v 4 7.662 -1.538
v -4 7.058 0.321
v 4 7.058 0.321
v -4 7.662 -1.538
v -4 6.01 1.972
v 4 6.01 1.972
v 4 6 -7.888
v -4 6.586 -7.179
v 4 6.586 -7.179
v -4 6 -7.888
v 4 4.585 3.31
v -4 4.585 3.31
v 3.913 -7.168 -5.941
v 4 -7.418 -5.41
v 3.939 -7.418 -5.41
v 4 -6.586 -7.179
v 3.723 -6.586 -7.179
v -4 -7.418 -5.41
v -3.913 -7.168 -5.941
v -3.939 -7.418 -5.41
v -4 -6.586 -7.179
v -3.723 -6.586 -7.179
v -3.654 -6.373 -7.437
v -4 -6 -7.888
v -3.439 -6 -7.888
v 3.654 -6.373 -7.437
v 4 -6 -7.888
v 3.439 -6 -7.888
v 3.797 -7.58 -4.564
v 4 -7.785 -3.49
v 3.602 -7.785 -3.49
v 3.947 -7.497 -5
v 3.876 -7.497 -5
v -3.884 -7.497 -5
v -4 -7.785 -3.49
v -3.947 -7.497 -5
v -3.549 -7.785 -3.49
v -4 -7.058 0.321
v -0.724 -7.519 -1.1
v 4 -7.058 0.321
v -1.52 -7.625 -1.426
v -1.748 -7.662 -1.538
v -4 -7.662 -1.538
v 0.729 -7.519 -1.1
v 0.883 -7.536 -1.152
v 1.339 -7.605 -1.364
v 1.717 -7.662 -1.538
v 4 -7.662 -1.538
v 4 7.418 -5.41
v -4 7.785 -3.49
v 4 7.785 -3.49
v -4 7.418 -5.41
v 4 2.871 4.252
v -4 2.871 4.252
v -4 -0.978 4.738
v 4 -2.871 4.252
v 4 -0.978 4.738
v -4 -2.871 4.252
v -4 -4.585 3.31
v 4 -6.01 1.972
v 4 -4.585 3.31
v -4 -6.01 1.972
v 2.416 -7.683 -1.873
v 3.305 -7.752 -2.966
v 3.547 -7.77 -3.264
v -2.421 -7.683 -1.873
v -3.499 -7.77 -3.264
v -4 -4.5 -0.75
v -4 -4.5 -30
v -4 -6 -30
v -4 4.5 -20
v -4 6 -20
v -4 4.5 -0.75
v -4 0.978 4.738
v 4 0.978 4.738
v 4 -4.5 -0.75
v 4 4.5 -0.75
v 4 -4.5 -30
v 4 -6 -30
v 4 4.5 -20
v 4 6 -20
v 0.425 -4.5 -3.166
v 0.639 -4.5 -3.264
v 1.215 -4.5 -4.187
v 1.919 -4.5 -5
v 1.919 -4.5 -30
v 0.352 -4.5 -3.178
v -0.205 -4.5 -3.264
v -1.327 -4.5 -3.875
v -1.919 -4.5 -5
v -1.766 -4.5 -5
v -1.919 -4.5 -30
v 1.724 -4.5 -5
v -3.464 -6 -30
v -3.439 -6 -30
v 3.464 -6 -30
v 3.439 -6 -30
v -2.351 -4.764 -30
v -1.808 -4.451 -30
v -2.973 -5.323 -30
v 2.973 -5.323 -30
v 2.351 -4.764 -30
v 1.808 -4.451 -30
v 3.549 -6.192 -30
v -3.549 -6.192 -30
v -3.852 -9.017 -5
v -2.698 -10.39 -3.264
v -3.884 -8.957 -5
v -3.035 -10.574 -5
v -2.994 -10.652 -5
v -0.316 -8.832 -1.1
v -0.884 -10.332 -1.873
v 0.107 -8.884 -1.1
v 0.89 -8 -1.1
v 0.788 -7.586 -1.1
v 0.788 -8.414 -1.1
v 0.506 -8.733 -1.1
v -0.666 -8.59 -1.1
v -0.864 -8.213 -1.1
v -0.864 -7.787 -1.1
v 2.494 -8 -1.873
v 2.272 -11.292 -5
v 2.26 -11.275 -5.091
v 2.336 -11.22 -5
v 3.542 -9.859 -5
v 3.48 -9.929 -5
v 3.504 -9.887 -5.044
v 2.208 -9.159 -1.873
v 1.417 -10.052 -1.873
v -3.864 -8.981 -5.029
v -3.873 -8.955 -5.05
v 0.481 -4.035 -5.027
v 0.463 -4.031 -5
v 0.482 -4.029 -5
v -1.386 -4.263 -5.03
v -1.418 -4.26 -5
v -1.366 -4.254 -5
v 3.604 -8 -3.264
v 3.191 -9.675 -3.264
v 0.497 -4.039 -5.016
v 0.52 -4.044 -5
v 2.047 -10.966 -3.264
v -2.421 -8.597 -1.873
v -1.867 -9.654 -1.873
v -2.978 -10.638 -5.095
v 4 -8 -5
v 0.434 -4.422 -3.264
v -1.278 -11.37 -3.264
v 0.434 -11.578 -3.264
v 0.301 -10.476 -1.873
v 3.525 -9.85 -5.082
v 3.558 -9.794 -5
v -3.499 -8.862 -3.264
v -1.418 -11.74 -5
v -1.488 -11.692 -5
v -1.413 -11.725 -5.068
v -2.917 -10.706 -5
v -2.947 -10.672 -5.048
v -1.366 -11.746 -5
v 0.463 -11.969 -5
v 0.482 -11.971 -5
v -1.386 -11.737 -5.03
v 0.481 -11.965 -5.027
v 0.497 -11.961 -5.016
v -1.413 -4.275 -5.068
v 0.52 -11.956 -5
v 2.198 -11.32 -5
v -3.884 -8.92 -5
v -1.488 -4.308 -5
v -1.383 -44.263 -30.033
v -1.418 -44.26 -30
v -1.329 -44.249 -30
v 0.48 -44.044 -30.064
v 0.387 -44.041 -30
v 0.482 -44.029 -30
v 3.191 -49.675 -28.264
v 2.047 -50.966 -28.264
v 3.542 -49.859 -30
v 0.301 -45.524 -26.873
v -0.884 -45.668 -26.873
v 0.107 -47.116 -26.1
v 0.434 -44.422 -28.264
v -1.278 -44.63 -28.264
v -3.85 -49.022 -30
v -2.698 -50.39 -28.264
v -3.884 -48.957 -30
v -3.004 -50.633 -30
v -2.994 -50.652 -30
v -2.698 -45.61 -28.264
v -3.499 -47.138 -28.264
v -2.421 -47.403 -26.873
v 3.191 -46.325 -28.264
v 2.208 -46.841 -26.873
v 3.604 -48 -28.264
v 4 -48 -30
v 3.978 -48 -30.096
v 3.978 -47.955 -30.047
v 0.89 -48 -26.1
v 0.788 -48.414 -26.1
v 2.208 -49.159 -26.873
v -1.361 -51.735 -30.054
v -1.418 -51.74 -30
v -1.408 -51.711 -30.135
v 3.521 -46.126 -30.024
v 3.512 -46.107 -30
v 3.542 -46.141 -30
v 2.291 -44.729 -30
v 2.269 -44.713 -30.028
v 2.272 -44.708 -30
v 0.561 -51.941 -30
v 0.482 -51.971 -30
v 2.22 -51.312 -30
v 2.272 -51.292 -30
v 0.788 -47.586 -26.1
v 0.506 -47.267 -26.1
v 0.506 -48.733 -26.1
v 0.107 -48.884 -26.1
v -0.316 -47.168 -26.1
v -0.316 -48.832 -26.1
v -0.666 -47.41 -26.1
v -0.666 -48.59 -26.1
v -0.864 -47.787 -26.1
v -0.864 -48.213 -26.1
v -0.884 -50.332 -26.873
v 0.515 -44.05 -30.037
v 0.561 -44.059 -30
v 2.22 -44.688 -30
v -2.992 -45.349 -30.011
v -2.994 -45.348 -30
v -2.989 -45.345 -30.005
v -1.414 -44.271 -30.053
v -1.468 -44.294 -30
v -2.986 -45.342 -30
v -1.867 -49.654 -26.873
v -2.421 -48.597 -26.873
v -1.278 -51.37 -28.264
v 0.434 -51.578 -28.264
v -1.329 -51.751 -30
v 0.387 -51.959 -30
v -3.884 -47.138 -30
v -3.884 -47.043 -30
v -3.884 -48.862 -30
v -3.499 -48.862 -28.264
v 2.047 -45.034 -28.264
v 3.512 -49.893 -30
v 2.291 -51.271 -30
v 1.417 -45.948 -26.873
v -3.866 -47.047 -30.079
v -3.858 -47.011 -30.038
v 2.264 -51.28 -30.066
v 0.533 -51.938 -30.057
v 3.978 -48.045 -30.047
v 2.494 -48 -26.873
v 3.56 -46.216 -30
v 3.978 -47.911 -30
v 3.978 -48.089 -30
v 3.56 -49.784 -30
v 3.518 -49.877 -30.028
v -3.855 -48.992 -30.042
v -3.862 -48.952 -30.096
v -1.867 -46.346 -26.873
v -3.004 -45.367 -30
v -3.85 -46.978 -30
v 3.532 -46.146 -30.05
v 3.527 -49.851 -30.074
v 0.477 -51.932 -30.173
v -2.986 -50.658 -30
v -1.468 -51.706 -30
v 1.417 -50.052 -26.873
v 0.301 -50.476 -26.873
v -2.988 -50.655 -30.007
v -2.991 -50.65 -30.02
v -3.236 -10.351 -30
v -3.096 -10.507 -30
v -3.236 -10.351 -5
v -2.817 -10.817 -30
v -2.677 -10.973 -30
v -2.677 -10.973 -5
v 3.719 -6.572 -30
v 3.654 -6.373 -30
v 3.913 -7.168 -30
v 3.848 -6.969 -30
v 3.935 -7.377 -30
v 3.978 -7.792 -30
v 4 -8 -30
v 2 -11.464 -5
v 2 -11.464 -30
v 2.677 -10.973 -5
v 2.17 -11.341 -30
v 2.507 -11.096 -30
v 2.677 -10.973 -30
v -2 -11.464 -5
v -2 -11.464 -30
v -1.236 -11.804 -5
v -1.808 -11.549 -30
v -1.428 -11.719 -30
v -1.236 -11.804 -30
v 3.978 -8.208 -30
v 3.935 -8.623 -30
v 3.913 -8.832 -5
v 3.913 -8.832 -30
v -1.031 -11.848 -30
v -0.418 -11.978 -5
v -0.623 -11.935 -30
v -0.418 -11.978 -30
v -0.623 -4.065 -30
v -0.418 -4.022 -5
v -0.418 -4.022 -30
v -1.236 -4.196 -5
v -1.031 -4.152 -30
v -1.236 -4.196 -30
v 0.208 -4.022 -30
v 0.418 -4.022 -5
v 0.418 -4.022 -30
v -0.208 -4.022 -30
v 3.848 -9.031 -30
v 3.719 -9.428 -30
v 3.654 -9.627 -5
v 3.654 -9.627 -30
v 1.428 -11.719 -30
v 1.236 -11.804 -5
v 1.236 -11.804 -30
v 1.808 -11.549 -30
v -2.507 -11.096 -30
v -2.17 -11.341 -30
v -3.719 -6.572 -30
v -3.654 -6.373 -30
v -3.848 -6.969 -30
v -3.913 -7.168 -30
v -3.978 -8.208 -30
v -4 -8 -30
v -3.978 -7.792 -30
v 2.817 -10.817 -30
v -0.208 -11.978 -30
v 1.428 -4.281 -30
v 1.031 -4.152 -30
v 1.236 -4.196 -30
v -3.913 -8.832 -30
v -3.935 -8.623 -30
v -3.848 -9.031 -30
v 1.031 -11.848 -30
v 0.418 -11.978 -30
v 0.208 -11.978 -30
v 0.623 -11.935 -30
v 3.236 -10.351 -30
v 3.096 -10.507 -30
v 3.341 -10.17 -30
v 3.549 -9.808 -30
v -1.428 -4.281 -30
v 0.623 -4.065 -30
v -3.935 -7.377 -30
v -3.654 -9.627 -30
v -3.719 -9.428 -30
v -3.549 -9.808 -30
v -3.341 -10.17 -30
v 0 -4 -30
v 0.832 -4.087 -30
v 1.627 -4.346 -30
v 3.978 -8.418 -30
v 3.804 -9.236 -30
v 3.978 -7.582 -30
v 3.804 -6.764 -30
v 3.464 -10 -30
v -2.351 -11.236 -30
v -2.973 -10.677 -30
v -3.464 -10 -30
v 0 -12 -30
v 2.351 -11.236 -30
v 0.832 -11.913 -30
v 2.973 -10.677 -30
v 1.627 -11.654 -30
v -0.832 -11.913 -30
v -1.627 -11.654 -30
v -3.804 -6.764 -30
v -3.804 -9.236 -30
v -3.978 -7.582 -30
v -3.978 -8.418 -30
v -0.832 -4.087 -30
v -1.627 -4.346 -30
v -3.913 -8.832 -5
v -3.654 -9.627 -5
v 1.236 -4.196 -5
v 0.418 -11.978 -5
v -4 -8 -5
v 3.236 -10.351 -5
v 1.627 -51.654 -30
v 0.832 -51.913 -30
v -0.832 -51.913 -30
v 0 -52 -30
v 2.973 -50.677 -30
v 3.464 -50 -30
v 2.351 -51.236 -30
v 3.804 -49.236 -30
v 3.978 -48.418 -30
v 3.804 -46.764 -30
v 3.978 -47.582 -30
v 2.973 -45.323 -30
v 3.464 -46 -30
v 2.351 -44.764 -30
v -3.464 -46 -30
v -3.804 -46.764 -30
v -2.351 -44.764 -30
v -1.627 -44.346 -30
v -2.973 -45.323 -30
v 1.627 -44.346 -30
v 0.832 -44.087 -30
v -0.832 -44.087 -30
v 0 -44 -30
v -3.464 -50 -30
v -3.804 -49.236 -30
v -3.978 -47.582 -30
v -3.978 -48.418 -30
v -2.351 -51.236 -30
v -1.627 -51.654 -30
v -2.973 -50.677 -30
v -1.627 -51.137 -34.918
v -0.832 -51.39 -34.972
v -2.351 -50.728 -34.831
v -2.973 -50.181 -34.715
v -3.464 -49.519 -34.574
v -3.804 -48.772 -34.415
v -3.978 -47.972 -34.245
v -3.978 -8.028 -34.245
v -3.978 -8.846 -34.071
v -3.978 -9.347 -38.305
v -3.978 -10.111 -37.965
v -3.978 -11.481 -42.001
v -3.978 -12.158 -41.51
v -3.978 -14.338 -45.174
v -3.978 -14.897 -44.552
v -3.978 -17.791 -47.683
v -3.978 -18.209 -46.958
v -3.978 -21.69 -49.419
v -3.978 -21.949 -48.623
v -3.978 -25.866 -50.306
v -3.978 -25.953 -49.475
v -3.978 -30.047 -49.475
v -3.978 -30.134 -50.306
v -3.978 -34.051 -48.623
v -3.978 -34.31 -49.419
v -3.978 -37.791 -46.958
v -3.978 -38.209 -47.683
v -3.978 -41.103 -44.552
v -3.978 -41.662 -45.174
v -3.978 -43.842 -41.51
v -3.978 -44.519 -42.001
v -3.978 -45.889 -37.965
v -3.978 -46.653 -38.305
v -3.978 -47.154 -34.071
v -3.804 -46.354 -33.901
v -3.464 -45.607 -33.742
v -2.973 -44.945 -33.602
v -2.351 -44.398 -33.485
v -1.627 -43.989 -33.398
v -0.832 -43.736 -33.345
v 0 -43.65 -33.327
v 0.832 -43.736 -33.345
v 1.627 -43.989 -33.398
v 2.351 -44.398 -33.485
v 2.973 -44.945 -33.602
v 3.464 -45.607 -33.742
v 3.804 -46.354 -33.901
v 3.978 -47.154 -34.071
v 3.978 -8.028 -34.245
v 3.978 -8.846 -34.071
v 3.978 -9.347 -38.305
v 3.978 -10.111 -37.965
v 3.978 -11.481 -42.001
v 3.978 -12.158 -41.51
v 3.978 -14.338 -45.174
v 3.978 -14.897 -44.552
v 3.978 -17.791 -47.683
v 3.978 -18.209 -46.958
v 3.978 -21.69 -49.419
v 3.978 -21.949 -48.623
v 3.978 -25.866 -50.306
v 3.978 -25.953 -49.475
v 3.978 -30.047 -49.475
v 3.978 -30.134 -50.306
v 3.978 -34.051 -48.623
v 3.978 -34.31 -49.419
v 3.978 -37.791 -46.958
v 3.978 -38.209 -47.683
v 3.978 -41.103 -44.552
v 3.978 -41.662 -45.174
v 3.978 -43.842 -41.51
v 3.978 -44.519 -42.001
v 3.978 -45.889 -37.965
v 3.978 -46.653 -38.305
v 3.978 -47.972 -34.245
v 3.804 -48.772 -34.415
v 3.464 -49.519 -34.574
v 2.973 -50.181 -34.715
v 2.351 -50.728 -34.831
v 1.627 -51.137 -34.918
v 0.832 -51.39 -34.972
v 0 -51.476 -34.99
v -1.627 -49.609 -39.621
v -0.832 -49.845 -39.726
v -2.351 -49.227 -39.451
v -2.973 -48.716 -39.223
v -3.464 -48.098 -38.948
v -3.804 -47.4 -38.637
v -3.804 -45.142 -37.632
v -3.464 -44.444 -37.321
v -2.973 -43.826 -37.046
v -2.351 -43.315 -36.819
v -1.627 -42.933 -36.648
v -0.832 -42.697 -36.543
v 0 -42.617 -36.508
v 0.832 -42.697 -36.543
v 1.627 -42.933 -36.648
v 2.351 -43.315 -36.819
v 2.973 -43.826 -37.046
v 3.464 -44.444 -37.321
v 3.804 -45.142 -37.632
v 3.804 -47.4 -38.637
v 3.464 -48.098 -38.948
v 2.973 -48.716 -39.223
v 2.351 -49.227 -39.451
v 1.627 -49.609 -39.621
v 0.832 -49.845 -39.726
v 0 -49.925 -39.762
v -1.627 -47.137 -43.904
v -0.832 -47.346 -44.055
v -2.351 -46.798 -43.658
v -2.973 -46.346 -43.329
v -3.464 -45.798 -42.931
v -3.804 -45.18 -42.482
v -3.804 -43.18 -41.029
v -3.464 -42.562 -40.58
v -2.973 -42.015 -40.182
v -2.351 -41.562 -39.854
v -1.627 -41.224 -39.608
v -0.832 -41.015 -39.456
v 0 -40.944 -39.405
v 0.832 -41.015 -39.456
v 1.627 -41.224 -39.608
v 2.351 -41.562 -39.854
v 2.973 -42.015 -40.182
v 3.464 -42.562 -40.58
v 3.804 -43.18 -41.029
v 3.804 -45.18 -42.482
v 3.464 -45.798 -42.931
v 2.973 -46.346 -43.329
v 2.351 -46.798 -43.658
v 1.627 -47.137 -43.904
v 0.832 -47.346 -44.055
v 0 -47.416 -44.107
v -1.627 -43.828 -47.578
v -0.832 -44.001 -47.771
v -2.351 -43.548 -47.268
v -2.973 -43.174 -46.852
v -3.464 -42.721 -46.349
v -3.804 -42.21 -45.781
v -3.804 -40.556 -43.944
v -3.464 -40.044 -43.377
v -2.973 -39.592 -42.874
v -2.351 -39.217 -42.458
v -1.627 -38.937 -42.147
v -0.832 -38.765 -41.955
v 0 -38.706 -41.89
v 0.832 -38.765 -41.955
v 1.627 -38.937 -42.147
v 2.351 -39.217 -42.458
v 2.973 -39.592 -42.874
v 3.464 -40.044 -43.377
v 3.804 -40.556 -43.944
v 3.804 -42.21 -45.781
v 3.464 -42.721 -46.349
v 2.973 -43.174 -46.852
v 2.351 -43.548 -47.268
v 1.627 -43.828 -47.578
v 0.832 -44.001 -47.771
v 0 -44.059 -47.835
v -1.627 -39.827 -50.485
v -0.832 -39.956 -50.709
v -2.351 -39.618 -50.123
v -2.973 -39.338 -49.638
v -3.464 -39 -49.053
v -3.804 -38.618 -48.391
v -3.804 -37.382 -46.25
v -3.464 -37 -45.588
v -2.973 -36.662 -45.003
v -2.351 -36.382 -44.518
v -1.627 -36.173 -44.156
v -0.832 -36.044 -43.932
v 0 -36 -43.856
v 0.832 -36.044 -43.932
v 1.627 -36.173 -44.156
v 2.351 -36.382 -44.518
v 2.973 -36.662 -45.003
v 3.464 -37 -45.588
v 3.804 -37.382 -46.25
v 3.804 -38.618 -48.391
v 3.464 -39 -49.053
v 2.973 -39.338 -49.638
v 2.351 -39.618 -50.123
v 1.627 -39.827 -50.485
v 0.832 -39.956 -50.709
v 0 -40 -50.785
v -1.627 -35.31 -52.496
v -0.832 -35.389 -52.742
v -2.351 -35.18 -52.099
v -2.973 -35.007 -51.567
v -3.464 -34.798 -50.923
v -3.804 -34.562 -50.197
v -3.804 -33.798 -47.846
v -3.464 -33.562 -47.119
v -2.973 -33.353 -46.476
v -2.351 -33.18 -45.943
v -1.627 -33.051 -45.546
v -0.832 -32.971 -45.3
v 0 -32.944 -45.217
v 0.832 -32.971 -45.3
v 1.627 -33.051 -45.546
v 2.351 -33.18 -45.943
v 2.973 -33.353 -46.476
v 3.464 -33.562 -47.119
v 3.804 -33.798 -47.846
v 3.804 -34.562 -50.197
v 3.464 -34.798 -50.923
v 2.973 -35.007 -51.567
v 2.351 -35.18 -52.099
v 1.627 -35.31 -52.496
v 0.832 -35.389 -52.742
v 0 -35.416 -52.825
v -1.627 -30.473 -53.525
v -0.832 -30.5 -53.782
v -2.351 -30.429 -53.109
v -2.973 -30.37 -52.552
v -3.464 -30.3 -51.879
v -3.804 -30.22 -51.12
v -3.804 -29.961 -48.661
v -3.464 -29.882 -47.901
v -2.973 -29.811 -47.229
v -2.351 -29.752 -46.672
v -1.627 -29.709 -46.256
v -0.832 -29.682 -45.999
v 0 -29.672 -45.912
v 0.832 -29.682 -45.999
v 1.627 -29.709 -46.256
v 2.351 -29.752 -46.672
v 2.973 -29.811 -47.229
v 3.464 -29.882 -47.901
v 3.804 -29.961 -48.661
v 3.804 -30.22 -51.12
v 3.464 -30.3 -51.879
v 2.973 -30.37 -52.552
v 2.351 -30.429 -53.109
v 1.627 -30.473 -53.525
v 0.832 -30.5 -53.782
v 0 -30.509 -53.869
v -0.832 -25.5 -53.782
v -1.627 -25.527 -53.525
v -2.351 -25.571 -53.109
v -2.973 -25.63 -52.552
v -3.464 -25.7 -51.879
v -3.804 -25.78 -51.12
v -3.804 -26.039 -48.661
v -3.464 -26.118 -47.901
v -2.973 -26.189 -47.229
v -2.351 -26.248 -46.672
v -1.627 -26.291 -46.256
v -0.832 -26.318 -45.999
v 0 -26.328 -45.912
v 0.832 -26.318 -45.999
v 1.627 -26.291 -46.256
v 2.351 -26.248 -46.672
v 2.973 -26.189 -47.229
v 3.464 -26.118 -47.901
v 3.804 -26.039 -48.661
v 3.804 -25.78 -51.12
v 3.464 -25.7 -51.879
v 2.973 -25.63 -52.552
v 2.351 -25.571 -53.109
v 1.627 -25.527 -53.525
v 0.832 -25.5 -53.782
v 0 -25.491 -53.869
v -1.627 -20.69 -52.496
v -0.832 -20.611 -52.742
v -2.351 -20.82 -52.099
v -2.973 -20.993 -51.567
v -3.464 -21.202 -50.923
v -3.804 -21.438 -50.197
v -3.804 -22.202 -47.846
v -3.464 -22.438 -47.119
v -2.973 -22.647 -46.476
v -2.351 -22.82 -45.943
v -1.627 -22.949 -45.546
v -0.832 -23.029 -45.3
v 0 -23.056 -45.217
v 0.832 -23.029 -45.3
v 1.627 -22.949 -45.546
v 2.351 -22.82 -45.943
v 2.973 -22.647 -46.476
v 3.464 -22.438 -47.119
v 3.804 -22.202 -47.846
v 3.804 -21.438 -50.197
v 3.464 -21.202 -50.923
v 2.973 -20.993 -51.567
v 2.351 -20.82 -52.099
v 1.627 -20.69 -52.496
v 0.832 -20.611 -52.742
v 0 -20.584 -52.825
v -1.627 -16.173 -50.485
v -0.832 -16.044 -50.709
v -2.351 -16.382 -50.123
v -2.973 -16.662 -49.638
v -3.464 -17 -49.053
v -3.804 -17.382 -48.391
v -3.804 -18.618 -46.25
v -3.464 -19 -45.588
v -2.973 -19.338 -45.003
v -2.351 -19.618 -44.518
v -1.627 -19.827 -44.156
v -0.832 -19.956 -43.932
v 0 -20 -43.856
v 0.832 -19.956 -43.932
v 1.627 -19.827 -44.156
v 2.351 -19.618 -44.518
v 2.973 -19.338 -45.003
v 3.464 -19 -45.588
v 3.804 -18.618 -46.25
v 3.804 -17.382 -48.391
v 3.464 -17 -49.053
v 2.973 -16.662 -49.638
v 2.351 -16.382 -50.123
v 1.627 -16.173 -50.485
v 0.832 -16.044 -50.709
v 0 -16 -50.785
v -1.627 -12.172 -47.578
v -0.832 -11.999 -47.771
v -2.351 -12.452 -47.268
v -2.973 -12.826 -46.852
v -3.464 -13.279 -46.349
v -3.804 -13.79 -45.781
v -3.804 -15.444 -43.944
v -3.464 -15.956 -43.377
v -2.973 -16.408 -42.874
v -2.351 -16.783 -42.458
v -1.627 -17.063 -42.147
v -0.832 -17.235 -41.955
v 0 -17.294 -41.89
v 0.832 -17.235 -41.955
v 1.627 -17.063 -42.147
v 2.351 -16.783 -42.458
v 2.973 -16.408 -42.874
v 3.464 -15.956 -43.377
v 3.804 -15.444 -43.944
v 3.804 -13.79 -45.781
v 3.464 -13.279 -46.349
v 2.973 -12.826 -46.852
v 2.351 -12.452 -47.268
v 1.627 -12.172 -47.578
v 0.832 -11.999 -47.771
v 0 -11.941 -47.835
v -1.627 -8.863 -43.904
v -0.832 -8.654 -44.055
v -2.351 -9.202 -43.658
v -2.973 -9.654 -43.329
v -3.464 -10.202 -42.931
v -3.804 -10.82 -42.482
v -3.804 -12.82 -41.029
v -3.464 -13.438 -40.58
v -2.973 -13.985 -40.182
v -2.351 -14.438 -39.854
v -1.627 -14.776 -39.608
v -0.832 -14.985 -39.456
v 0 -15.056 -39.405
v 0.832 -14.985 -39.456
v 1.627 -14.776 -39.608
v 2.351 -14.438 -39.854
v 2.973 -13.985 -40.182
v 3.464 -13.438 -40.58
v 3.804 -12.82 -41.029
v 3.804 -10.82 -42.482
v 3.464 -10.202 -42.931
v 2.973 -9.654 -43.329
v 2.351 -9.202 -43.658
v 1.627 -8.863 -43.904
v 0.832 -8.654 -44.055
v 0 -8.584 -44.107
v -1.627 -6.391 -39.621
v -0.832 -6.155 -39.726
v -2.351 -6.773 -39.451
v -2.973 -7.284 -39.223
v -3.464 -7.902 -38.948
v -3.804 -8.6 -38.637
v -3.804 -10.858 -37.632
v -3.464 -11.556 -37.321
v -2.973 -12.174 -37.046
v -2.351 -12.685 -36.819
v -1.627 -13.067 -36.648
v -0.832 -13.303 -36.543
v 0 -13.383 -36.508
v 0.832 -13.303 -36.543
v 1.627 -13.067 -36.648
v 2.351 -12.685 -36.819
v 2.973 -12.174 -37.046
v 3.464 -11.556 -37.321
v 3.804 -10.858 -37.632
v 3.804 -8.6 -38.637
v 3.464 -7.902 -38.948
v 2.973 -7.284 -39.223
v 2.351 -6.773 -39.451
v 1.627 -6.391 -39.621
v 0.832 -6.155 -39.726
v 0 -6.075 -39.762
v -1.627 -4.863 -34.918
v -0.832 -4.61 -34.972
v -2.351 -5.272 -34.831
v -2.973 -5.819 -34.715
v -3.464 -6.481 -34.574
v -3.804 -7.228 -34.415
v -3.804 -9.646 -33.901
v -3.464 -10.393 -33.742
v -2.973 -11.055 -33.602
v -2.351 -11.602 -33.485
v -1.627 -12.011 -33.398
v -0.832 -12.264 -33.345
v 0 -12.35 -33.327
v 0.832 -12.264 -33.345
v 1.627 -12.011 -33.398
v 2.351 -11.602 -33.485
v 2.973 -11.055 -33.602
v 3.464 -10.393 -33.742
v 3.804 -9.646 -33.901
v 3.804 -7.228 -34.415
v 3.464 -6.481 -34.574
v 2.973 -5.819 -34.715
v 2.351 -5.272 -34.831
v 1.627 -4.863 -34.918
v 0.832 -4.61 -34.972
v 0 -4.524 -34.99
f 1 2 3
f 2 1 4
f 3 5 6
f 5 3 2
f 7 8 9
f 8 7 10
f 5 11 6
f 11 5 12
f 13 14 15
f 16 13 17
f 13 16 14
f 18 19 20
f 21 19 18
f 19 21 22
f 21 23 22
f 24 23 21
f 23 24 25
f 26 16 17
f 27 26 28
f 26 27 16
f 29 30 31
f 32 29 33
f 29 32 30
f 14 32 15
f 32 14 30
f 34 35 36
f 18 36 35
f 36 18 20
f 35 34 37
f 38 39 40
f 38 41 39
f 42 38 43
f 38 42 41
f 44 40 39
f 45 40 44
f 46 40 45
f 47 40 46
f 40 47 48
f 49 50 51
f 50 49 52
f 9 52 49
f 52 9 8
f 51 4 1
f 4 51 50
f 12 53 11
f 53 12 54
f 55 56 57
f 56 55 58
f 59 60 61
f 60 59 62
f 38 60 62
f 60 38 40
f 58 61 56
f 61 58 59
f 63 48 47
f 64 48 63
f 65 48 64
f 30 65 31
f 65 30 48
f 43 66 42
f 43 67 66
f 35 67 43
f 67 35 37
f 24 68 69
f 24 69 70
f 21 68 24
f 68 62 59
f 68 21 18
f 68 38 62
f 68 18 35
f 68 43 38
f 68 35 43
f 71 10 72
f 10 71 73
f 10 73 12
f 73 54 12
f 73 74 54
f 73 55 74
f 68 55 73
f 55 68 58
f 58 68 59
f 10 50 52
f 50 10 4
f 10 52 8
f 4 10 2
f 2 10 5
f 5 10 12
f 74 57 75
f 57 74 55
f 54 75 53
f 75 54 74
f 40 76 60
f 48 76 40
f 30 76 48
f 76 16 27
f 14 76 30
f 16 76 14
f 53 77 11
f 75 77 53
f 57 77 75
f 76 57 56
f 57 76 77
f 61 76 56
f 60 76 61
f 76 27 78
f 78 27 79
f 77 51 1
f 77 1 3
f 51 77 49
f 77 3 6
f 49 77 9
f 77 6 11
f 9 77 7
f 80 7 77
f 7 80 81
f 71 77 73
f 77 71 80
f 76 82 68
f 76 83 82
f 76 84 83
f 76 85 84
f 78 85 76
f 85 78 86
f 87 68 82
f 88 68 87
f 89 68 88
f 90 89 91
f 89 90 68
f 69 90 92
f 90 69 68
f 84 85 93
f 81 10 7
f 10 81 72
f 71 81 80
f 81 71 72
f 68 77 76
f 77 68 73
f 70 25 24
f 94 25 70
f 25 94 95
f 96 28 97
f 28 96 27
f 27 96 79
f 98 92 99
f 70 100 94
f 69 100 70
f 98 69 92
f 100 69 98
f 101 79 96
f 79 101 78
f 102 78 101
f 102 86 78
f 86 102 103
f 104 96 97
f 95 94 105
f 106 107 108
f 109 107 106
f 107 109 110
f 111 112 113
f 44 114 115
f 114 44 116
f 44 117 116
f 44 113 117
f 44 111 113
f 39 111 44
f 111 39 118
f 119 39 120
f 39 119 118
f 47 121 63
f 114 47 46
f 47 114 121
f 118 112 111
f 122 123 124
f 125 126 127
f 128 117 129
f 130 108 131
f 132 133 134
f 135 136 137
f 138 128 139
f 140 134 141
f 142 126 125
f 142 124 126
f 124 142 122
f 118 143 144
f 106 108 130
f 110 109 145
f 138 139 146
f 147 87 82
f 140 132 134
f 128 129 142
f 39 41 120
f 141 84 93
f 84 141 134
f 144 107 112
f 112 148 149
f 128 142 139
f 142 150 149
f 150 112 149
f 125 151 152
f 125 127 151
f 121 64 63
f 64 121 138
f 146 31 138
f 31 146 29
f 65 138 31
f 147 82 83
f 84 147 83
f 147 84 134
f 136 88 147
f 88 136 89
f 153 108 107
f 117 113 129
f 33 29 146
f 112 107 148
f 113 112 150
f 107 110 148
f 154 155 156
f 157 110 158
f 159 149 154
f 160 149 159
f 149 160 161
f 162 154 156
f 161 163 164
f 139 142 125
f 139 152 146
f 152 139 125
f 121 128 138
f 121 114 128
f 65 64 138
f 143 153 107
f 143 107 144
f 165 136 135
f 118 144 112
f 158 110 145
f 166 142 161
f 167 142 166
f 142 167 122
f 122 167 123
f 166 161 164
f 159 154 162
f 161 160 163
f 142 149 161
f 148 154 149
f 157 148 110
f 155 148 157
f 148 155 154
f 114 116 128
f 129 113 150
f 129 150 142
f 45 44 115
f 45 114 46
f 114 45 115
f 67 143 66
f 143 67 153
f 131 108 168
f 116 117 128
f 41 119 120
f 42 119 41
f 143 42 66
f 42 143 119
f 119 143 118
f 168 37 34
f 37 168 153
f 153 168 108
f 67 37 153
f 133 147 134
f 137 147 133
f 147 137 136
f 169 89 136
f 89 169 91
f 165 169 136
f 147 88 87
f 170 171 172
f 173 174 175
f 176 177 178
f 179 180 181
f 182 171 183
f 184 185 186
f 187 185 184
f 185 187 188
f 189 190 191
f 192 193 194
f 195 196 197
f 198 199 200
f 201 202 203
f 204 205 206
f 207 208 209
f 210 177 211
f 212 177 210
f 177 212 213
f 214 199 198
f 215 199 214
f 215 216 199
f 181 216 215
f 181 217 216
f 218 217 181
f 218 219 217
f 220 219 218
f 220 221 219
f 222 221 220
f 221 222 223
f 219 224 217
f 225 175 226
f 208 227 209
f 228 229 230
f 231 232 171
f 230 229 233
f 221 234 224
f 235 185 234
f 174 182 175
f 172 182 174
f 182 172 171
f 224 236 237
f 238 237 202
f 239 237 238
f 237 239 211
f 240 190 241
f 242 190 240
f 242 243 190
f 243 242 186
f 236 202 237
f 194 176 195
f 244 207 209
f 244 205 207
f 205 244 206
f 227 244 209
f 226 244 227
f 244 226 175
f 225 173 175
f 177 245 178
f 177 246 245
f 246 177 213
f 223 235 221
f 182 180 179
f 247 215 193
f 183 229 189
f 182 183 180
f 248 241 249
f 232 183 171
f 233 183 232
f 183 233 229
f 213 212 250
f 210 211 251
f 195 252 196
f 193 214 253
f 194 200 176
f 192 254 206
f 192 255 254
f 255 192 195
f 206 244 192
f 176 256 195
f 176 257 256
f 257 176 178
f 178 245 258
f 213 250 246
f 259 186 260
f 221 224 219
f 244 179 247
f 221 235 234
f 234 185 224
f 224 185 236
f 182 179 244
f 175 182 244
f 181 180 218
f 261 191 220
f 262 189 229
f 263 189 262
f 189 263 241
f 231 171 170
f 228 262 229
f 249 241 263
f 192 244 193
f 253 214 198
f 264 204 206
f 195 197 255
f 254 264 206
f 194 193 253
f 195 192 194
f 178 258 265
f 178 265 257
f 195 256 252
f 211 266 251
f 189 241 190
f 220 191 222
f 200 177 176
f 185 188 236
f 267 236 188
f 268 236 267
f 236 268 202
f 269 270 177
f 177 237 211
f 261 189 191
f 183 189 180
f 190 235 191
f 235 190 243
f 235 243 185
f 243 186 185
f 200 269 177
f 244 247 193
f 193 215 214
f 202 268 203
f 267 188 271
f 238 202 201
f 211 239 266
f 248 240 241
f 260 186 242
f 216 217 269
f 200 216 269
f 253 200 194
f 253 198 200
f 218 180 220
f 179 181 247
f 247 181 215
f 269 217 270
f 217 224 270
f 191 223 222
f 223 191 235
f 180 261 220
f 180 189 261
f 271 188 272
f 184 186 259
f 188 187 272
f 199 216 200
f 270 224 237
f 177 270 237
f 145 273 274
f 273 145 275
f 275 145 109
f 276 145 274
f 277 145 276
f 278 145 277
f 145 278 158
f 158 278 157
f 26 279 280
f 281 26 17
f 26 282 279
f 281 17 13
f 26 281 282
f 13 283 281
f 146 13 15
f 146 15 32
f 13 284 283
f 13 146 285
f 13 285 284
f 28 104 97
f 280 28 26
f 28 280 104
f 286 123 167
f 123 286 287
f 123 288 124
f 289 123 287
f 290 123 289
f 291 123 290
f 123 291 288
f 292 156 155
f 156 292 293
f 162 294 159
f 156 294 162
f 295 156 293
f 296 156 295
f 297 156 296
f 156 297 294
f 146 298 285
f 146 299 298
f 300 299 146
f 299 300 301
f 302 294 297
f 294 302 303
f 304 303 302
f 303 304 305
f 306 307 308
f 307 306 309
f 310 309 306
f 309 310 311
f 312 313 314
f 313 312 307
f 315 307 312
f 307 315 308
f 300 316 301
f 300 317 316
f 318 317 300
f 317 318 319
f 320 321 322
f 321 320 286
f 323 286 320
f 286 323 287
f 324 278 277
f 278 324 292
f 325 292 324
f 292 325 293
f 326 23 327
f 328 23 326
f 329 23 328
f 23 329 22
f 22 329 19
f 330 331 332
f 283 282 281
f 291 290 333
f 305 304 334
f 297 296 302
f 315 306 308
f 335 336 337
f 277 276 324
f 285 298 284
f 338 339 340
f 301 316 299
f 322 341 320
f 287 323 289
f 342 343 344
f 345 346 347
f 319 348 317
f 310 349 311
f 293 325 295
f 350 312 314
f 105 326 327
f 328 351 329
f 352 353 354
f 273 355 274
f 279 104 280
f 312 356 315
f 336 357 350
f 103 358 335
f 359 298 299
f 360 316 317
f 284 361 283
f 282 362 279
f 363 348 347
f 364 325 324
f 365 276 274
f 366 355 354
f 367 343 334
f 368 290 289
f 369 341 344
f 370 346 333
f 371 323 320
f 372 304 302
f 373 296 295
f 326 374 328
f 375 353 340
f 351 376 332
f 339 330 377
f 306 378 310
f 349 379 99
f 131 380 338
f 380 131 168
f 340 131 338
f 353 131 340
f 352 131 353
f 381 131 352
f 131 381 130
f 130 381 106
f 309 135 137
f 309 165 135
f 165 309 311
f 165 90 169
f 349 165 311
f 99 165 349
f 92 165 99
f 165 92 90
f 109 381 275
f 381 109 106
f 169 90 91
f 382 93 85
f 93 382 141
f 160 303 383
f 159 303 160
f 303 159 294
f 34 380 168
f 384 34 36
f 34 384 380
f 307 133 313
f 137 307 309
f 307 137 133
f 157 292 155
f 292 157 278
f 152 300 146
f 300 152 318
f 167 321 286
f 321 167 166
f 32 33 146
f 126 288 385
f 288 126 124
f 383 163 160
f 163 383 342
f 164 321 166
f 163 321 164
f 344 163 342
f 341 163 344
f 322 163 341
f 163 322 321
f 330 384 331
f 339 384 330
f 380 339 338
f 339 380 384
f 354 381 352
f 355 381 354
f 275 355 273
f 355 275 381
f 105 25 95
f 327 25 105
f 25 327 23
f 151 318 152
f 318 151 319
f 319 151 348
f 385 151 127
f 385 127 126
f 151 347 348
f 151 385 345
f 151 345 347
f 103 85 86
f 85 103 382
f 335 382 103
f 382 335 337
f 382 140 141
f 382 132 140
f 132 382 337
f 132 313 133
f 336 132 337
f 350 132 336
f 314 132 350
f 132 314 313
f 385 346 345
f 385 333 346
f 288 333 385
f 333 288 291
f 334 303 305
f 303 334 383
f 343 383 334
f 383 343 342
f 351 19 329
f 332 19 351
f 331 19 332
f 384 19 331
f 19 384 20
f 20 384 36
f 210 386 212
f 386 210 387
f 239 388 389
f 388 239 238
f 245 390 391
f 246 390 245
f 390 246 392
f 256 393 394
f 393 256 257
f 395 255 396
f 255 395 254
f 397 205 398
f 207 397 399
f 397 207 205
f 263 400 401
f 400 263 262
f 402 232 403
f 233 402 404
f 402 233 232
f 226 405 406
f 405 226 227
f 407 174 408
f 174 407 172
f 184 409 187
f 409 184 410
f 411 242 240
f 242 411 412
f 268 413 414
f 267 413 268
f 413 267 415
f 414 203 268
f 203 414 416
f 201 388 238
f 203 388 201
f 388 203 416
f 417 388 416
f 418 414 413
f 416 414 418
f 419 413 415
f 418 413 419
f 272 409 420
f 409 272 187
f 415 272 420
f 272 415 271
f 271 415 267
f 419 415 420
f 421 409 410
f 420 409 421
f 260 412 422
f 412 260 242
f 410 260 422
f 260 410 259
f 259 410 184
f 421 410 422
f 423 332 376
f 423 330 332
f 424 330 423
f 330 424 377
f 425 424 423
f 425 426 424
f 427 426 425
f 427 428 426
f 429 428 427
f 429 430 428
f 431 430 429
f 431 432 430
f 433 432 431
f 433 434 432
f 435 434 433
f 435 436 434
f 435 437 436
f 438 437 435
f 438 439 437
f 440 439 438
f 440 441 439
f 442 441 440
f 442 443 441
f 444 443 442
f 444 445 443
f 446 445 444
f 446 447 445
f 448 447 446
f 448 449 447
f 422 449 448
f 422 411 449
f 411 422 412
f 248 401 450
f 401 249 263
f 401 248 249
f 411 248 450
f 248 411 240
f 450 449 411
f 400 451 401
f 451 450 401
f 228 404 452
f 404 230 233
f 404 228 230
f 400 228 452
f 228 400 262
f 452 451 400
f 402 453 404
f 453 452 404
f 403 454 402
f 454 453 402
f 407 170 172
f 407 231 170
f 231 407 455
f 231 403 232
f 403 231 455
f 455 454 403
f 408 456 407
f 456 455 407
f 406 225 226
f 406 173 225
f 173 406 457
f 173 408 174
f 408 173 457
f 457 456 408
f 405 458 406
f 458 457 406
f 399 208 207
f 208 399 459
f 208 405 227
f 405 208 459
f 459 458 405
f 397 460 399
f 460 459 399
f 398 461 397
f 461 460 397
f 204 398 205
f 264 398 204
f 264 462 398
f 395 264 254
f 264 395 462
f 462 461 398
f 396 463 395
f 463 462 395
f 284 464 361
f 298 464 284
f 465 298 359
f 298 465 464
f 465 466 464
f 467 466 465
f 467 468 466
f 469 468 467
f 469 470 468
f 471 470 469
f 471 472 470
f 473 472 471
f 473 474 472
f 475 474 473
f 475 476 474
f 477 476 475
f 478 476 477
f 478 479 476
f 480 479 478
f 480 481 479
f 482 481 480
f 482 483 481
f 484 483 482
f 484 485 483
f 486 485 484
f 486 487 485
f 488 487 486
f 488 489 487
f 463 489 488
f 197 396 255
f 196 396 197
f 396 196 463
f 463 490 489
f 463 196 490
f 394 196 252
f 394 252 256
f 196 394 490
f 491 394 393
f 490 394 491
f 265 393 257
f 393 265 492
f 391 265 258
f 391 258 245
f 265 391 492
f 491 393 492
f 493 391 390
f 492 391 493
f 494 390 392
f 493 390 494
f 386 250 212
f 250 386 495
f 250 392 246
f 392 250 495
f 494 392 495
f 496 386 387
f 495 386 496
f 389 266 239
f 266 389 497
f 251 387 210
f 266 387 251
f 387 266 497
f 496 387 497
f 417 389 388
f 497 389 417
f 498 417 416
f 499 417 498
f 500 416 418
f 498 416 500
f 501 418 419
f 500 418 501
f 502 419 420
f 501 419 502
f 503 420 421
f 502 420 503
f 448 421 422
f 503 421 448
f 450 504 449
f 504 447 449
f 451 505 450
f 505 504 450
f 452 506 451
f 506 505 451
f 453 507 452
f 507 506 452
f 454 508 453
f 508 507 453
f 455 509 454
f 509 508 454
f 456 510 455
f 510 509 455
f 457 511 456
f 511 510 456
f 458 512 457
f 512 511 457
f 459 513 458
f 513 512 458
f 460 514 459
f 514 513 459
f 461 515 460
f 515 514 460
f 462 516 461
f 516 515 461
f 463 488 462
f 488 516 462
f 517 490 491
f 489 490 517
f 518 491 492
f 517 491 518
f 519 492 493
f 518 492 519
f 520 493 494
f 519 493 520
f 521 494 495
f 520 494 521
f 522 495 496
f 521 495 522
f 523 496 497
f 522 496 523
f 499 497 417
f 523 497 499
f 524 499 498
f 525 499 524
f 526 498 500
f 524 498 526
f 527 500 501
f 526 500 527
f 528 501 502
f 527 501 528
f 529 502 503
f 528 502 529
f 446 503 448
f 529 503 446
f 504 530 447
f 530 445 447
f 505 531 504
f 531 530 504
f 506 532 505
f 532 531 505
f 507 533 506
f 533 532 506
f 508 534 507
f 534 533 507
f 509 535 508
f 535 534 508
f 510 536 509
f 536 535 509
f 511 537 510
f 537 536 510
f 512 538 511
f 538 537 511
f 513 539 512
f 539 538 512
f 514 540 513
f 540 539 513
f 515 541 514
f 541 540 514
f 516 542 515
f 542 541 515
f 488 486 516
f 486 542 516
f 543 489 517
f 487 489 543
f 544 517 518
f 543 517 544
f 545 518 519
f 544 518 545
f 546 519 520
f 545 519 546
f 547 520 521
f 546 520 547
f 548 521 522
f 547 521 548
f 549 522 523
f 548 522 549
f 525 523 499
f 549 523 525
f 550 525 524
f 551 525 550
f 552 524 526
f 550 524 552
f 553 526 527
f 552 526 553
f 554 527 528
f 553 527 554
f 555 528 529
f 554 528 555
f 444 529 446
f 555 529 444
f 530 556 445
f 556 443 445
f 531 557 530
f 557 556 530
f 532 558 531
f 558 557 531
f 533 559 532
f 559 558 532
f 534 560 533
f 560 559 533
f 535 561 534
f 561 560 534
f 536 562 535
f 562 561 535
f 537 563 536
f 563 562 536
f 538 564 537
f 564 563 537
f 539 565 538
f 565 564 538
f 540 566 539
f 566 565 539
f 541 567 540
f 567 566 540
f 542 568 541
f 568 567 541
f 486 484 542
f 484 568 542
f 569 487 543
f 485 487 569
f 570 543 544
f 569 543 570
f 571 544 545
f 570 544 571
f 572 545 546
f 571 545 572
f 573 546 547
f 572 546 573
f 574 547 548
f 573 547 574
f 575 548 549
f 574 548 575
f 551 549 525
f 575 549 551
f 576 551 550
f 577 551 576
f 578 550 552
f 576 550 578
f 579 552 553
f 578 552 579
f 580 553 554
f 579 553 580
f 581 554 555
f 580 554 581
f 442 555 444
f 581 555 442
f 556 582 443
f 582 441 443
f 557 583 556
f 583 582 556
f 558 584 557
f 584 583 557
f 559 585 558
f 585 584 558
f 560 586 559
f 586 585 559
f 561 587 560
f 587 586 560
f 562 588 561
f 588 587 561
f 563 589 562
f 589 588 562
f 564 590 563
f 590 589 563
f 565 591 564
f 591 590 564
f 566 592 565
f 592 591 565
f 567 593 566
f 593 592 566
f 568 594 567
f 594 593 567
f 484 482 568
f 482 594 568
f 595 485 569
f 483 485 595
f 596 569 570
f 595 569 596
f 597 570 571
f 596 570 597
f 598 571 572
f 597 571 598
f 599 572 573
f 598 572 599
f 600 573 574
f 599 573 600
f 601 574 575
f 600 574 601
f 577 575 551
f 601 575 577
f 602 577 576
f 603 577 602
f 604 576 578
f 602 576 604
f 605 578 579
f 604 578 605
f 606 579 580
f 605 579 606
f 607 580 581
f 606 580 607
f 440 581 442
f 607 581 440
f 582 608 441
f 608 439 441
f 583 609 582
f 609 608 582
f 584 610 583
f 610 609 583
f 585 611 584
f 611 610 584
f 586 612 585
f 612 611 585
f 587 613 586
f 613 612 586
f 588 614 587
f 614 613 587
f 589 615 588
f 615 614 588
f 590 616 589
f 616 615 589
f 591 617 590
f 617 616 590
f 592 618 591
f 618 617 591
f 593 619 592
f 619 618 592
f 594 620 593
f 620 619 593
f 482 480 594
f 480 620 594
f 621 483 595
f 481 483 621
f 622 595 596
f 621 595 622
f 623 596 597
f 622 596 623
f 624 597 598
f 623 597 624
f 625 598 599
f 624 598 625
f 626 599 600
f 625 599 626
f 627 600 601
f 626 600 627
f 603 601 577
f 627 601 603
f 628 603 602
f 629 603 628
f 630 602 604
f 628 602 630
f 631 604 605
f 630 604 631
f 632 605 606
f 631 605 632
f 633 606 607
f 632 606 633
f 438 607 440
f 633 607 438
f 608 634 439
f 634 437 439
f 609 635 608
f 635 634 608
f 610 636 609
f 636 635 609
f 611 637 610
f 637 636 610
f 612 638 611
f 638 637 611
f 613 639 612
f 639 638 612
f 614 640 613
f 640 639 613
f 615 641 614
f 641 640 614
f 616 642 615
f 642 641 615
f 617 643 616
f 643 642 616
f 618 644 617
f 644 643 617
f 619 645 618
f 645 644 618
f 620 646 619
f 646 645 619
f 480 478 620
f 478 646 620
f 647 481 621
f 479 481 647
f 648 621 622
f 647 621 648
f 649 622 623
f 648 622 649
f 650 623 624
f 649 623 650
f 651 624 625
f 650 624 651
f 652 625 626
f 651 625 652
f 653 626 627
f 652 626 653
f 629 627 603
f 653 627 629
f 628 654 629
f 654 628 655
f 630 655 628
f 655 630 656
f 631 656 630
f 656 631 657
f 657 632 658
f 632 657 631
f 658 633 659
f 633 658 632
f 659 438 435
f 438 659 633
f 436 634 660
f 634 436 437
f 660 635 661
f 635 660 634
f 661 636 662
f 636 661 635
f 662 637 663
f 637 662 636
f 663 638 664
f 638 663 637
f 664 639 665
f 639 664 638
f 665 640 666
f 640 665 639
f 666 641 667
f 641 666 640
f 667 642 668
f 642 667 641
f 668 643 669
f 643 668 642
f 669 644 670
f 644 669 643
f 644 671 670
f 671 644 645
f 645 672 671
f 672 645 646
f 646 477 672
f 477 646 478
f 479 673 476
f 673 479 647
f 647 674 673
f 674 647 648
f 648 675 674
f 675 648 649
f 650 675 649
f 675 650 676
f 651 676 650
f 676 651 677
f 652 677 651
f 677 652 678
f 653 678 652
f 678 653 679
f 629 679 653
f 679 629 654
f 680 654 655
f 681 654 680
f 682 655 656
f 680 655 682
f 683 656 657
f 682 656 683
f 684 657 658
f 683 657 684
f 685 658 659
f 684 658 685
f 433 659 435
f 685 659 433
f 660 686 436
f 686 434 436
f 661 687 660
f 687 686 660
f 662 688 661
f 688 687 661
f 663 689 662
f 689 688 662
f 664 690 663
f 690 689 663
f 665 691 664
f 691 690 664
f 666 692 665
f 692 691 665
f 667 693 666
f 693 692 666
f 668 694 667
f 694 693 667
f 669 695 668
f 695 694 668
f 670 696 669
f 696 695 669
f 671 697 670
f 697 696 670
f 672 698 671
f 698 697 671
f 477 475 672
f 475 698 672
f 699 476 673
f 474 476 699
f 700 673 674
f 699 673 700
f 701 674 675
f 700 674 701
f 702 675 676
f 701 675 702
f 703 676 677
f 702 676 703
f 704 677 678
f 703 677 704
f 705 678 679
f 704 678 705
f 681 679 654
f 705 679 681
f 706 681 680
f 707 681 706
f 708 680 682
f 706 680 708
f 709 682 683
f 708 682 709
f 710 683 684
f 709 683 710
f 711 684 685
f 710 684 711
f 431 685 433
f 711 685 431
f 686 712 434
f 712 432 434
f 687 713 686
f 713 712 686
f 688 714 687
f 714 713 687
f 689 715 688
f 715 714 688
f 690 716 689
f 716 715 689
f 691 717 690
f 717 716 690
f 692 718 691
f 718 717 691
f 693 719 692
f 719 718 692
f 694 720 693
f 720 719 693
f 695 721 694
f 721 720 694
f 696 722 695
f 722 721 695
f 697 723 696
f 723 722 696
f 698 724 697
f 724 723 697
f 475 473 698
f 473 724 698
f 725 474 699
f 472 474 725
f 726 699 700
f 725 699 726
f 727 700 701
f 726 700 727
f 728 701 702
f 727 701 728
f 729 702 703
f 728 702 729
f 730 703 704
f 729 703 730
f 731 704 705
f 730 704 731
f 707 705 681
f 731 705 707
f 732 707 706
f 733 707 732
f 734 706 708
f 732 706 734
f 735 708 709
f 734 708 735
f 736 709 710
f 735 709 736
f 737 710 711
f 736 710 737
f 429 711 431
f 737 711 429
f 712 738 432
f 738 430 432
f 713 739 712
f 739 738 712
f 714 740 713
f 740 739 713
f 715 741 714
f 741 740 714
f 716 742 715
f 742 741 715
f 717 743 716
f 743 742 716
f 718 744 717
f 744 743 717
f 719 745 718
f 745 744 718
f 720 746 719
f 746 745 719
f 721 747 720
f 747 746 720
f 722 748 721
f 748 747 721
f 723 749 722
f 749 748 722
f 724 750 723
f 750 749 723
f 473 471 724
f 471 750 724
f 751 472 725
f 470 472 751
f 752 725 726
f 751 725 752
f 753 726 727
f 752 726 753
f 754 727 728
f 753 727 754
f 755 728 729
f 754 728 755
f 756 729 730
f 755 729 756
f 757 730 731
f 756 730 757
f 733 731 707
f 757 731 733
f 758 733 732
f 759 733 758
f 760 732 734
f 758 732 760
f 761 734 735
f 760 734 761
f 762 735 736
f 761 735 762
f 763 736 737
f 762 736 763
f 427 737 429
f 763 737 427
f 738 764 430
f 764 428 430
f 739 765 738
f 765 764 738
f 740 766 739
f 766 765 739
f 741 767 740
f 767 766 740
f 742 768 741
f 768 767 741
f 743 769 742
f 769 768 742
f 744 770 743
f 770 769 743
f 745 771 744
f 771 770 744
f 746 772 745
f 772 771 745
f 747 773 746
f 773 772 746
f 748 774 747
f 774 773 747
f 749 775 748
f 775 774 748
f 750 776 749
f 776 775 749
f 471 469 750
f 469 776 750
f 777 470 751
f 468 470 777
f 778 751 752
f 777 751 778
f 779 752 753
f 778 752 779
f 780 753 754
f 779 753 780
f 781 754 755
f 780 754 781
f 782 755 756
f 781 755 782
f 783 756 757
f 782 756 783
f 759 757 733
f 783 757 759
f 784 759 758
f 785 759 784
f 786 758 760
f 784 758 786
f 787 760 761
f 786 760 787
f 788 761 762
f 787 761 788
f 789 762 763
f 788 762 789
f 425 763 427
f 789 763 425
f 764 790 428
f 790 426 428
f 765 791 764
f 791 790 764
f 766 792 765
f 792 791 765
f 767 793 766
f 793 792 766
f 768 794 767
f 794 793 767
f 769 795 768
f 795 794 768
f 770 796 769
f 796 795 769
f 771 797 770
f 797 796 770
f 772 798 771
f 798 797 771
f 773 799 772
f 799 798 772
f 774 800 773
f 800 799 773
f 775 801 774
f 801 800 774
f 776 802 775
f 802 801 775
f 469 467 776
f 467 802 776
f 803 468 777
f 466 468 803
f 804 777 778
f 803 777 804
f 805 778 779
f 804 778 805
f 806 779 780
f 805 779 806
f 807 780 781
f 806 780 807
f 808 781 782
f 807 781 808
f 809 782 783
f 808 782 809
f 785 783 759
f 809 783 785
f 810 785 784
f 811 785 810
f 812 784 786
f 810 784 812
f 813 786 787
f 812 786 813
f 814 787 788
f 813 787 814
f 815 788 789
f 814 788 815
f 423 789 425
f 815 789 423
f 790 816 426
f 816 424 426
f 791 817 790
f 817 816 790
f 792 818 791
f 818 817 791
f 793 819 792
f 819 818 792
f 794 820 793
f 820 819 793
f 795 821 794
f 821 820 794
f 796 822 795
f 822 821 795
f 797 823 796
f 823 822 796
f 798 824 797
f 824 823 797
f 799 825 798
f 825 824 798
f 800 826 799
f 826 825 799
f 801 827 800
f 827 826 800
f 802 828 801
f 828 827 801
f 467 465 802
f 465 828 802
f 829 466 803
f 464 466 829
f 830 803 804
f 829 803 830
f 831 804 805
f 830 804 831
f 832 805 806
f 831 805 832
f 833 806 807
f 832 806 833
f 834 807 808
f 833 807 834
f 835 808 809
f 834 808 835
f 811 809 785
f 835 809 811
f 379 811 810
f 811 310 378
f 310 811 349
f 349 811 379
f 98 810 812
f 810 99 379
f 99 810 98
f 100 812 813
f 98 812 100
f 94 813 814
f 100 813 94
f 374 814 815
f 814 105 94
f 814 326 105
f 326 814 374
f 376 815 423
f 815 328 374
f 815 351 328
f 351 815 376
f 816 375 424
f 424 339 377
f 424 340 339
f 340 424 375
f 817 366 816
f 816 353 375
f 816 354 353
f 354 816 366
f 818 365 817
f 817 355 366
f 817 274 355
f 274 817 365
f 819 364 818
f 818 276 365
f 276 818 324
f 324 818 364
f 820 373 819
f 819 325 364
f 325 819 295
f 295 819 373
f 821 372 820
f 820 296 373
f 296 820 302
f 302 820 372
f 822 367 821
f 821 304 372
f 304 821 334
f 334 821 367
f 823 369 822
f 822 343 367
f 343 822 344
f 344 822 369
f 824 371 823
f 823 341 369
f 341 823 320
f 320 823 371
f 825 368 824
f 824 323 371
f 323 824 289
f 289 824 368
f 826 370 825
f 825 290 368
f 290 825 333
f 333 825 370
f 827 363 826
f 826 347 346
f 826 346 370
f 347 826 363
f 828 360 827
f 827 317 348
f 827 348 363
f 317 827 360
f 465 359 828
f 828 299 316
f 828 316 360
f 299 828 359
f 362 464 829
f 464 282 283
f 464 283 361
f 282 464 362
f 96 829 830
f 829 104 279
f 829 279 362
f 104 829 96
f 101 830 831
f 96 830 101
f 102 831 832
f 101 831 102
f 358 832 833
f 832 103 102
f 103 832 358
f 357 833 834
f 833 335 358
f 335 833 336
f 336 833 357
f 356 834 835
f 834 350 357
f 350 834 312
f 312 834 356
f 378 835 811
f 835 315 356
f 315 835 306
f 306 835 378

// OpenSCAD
include<lib.scad>


hl1=20;
hl2=12;
hl3=30;
hw=8;
ht=1.5;


hd=8;
hl=25;
e=20;

difference(){
    translate([0,0,-hl2/4]) rotate([0,90,0])
        cylinder(h=hw, d=hl2*1.3, center=true);
    translate([0,0,-hl3/2])
        cube([hw*1.05,hl2-2*ht,hl3], center=true);
}
hang(hl1,hl2,hl3,hw,ht);
translate([0,-8,-hl3])
	hook(hd,hl,e);
